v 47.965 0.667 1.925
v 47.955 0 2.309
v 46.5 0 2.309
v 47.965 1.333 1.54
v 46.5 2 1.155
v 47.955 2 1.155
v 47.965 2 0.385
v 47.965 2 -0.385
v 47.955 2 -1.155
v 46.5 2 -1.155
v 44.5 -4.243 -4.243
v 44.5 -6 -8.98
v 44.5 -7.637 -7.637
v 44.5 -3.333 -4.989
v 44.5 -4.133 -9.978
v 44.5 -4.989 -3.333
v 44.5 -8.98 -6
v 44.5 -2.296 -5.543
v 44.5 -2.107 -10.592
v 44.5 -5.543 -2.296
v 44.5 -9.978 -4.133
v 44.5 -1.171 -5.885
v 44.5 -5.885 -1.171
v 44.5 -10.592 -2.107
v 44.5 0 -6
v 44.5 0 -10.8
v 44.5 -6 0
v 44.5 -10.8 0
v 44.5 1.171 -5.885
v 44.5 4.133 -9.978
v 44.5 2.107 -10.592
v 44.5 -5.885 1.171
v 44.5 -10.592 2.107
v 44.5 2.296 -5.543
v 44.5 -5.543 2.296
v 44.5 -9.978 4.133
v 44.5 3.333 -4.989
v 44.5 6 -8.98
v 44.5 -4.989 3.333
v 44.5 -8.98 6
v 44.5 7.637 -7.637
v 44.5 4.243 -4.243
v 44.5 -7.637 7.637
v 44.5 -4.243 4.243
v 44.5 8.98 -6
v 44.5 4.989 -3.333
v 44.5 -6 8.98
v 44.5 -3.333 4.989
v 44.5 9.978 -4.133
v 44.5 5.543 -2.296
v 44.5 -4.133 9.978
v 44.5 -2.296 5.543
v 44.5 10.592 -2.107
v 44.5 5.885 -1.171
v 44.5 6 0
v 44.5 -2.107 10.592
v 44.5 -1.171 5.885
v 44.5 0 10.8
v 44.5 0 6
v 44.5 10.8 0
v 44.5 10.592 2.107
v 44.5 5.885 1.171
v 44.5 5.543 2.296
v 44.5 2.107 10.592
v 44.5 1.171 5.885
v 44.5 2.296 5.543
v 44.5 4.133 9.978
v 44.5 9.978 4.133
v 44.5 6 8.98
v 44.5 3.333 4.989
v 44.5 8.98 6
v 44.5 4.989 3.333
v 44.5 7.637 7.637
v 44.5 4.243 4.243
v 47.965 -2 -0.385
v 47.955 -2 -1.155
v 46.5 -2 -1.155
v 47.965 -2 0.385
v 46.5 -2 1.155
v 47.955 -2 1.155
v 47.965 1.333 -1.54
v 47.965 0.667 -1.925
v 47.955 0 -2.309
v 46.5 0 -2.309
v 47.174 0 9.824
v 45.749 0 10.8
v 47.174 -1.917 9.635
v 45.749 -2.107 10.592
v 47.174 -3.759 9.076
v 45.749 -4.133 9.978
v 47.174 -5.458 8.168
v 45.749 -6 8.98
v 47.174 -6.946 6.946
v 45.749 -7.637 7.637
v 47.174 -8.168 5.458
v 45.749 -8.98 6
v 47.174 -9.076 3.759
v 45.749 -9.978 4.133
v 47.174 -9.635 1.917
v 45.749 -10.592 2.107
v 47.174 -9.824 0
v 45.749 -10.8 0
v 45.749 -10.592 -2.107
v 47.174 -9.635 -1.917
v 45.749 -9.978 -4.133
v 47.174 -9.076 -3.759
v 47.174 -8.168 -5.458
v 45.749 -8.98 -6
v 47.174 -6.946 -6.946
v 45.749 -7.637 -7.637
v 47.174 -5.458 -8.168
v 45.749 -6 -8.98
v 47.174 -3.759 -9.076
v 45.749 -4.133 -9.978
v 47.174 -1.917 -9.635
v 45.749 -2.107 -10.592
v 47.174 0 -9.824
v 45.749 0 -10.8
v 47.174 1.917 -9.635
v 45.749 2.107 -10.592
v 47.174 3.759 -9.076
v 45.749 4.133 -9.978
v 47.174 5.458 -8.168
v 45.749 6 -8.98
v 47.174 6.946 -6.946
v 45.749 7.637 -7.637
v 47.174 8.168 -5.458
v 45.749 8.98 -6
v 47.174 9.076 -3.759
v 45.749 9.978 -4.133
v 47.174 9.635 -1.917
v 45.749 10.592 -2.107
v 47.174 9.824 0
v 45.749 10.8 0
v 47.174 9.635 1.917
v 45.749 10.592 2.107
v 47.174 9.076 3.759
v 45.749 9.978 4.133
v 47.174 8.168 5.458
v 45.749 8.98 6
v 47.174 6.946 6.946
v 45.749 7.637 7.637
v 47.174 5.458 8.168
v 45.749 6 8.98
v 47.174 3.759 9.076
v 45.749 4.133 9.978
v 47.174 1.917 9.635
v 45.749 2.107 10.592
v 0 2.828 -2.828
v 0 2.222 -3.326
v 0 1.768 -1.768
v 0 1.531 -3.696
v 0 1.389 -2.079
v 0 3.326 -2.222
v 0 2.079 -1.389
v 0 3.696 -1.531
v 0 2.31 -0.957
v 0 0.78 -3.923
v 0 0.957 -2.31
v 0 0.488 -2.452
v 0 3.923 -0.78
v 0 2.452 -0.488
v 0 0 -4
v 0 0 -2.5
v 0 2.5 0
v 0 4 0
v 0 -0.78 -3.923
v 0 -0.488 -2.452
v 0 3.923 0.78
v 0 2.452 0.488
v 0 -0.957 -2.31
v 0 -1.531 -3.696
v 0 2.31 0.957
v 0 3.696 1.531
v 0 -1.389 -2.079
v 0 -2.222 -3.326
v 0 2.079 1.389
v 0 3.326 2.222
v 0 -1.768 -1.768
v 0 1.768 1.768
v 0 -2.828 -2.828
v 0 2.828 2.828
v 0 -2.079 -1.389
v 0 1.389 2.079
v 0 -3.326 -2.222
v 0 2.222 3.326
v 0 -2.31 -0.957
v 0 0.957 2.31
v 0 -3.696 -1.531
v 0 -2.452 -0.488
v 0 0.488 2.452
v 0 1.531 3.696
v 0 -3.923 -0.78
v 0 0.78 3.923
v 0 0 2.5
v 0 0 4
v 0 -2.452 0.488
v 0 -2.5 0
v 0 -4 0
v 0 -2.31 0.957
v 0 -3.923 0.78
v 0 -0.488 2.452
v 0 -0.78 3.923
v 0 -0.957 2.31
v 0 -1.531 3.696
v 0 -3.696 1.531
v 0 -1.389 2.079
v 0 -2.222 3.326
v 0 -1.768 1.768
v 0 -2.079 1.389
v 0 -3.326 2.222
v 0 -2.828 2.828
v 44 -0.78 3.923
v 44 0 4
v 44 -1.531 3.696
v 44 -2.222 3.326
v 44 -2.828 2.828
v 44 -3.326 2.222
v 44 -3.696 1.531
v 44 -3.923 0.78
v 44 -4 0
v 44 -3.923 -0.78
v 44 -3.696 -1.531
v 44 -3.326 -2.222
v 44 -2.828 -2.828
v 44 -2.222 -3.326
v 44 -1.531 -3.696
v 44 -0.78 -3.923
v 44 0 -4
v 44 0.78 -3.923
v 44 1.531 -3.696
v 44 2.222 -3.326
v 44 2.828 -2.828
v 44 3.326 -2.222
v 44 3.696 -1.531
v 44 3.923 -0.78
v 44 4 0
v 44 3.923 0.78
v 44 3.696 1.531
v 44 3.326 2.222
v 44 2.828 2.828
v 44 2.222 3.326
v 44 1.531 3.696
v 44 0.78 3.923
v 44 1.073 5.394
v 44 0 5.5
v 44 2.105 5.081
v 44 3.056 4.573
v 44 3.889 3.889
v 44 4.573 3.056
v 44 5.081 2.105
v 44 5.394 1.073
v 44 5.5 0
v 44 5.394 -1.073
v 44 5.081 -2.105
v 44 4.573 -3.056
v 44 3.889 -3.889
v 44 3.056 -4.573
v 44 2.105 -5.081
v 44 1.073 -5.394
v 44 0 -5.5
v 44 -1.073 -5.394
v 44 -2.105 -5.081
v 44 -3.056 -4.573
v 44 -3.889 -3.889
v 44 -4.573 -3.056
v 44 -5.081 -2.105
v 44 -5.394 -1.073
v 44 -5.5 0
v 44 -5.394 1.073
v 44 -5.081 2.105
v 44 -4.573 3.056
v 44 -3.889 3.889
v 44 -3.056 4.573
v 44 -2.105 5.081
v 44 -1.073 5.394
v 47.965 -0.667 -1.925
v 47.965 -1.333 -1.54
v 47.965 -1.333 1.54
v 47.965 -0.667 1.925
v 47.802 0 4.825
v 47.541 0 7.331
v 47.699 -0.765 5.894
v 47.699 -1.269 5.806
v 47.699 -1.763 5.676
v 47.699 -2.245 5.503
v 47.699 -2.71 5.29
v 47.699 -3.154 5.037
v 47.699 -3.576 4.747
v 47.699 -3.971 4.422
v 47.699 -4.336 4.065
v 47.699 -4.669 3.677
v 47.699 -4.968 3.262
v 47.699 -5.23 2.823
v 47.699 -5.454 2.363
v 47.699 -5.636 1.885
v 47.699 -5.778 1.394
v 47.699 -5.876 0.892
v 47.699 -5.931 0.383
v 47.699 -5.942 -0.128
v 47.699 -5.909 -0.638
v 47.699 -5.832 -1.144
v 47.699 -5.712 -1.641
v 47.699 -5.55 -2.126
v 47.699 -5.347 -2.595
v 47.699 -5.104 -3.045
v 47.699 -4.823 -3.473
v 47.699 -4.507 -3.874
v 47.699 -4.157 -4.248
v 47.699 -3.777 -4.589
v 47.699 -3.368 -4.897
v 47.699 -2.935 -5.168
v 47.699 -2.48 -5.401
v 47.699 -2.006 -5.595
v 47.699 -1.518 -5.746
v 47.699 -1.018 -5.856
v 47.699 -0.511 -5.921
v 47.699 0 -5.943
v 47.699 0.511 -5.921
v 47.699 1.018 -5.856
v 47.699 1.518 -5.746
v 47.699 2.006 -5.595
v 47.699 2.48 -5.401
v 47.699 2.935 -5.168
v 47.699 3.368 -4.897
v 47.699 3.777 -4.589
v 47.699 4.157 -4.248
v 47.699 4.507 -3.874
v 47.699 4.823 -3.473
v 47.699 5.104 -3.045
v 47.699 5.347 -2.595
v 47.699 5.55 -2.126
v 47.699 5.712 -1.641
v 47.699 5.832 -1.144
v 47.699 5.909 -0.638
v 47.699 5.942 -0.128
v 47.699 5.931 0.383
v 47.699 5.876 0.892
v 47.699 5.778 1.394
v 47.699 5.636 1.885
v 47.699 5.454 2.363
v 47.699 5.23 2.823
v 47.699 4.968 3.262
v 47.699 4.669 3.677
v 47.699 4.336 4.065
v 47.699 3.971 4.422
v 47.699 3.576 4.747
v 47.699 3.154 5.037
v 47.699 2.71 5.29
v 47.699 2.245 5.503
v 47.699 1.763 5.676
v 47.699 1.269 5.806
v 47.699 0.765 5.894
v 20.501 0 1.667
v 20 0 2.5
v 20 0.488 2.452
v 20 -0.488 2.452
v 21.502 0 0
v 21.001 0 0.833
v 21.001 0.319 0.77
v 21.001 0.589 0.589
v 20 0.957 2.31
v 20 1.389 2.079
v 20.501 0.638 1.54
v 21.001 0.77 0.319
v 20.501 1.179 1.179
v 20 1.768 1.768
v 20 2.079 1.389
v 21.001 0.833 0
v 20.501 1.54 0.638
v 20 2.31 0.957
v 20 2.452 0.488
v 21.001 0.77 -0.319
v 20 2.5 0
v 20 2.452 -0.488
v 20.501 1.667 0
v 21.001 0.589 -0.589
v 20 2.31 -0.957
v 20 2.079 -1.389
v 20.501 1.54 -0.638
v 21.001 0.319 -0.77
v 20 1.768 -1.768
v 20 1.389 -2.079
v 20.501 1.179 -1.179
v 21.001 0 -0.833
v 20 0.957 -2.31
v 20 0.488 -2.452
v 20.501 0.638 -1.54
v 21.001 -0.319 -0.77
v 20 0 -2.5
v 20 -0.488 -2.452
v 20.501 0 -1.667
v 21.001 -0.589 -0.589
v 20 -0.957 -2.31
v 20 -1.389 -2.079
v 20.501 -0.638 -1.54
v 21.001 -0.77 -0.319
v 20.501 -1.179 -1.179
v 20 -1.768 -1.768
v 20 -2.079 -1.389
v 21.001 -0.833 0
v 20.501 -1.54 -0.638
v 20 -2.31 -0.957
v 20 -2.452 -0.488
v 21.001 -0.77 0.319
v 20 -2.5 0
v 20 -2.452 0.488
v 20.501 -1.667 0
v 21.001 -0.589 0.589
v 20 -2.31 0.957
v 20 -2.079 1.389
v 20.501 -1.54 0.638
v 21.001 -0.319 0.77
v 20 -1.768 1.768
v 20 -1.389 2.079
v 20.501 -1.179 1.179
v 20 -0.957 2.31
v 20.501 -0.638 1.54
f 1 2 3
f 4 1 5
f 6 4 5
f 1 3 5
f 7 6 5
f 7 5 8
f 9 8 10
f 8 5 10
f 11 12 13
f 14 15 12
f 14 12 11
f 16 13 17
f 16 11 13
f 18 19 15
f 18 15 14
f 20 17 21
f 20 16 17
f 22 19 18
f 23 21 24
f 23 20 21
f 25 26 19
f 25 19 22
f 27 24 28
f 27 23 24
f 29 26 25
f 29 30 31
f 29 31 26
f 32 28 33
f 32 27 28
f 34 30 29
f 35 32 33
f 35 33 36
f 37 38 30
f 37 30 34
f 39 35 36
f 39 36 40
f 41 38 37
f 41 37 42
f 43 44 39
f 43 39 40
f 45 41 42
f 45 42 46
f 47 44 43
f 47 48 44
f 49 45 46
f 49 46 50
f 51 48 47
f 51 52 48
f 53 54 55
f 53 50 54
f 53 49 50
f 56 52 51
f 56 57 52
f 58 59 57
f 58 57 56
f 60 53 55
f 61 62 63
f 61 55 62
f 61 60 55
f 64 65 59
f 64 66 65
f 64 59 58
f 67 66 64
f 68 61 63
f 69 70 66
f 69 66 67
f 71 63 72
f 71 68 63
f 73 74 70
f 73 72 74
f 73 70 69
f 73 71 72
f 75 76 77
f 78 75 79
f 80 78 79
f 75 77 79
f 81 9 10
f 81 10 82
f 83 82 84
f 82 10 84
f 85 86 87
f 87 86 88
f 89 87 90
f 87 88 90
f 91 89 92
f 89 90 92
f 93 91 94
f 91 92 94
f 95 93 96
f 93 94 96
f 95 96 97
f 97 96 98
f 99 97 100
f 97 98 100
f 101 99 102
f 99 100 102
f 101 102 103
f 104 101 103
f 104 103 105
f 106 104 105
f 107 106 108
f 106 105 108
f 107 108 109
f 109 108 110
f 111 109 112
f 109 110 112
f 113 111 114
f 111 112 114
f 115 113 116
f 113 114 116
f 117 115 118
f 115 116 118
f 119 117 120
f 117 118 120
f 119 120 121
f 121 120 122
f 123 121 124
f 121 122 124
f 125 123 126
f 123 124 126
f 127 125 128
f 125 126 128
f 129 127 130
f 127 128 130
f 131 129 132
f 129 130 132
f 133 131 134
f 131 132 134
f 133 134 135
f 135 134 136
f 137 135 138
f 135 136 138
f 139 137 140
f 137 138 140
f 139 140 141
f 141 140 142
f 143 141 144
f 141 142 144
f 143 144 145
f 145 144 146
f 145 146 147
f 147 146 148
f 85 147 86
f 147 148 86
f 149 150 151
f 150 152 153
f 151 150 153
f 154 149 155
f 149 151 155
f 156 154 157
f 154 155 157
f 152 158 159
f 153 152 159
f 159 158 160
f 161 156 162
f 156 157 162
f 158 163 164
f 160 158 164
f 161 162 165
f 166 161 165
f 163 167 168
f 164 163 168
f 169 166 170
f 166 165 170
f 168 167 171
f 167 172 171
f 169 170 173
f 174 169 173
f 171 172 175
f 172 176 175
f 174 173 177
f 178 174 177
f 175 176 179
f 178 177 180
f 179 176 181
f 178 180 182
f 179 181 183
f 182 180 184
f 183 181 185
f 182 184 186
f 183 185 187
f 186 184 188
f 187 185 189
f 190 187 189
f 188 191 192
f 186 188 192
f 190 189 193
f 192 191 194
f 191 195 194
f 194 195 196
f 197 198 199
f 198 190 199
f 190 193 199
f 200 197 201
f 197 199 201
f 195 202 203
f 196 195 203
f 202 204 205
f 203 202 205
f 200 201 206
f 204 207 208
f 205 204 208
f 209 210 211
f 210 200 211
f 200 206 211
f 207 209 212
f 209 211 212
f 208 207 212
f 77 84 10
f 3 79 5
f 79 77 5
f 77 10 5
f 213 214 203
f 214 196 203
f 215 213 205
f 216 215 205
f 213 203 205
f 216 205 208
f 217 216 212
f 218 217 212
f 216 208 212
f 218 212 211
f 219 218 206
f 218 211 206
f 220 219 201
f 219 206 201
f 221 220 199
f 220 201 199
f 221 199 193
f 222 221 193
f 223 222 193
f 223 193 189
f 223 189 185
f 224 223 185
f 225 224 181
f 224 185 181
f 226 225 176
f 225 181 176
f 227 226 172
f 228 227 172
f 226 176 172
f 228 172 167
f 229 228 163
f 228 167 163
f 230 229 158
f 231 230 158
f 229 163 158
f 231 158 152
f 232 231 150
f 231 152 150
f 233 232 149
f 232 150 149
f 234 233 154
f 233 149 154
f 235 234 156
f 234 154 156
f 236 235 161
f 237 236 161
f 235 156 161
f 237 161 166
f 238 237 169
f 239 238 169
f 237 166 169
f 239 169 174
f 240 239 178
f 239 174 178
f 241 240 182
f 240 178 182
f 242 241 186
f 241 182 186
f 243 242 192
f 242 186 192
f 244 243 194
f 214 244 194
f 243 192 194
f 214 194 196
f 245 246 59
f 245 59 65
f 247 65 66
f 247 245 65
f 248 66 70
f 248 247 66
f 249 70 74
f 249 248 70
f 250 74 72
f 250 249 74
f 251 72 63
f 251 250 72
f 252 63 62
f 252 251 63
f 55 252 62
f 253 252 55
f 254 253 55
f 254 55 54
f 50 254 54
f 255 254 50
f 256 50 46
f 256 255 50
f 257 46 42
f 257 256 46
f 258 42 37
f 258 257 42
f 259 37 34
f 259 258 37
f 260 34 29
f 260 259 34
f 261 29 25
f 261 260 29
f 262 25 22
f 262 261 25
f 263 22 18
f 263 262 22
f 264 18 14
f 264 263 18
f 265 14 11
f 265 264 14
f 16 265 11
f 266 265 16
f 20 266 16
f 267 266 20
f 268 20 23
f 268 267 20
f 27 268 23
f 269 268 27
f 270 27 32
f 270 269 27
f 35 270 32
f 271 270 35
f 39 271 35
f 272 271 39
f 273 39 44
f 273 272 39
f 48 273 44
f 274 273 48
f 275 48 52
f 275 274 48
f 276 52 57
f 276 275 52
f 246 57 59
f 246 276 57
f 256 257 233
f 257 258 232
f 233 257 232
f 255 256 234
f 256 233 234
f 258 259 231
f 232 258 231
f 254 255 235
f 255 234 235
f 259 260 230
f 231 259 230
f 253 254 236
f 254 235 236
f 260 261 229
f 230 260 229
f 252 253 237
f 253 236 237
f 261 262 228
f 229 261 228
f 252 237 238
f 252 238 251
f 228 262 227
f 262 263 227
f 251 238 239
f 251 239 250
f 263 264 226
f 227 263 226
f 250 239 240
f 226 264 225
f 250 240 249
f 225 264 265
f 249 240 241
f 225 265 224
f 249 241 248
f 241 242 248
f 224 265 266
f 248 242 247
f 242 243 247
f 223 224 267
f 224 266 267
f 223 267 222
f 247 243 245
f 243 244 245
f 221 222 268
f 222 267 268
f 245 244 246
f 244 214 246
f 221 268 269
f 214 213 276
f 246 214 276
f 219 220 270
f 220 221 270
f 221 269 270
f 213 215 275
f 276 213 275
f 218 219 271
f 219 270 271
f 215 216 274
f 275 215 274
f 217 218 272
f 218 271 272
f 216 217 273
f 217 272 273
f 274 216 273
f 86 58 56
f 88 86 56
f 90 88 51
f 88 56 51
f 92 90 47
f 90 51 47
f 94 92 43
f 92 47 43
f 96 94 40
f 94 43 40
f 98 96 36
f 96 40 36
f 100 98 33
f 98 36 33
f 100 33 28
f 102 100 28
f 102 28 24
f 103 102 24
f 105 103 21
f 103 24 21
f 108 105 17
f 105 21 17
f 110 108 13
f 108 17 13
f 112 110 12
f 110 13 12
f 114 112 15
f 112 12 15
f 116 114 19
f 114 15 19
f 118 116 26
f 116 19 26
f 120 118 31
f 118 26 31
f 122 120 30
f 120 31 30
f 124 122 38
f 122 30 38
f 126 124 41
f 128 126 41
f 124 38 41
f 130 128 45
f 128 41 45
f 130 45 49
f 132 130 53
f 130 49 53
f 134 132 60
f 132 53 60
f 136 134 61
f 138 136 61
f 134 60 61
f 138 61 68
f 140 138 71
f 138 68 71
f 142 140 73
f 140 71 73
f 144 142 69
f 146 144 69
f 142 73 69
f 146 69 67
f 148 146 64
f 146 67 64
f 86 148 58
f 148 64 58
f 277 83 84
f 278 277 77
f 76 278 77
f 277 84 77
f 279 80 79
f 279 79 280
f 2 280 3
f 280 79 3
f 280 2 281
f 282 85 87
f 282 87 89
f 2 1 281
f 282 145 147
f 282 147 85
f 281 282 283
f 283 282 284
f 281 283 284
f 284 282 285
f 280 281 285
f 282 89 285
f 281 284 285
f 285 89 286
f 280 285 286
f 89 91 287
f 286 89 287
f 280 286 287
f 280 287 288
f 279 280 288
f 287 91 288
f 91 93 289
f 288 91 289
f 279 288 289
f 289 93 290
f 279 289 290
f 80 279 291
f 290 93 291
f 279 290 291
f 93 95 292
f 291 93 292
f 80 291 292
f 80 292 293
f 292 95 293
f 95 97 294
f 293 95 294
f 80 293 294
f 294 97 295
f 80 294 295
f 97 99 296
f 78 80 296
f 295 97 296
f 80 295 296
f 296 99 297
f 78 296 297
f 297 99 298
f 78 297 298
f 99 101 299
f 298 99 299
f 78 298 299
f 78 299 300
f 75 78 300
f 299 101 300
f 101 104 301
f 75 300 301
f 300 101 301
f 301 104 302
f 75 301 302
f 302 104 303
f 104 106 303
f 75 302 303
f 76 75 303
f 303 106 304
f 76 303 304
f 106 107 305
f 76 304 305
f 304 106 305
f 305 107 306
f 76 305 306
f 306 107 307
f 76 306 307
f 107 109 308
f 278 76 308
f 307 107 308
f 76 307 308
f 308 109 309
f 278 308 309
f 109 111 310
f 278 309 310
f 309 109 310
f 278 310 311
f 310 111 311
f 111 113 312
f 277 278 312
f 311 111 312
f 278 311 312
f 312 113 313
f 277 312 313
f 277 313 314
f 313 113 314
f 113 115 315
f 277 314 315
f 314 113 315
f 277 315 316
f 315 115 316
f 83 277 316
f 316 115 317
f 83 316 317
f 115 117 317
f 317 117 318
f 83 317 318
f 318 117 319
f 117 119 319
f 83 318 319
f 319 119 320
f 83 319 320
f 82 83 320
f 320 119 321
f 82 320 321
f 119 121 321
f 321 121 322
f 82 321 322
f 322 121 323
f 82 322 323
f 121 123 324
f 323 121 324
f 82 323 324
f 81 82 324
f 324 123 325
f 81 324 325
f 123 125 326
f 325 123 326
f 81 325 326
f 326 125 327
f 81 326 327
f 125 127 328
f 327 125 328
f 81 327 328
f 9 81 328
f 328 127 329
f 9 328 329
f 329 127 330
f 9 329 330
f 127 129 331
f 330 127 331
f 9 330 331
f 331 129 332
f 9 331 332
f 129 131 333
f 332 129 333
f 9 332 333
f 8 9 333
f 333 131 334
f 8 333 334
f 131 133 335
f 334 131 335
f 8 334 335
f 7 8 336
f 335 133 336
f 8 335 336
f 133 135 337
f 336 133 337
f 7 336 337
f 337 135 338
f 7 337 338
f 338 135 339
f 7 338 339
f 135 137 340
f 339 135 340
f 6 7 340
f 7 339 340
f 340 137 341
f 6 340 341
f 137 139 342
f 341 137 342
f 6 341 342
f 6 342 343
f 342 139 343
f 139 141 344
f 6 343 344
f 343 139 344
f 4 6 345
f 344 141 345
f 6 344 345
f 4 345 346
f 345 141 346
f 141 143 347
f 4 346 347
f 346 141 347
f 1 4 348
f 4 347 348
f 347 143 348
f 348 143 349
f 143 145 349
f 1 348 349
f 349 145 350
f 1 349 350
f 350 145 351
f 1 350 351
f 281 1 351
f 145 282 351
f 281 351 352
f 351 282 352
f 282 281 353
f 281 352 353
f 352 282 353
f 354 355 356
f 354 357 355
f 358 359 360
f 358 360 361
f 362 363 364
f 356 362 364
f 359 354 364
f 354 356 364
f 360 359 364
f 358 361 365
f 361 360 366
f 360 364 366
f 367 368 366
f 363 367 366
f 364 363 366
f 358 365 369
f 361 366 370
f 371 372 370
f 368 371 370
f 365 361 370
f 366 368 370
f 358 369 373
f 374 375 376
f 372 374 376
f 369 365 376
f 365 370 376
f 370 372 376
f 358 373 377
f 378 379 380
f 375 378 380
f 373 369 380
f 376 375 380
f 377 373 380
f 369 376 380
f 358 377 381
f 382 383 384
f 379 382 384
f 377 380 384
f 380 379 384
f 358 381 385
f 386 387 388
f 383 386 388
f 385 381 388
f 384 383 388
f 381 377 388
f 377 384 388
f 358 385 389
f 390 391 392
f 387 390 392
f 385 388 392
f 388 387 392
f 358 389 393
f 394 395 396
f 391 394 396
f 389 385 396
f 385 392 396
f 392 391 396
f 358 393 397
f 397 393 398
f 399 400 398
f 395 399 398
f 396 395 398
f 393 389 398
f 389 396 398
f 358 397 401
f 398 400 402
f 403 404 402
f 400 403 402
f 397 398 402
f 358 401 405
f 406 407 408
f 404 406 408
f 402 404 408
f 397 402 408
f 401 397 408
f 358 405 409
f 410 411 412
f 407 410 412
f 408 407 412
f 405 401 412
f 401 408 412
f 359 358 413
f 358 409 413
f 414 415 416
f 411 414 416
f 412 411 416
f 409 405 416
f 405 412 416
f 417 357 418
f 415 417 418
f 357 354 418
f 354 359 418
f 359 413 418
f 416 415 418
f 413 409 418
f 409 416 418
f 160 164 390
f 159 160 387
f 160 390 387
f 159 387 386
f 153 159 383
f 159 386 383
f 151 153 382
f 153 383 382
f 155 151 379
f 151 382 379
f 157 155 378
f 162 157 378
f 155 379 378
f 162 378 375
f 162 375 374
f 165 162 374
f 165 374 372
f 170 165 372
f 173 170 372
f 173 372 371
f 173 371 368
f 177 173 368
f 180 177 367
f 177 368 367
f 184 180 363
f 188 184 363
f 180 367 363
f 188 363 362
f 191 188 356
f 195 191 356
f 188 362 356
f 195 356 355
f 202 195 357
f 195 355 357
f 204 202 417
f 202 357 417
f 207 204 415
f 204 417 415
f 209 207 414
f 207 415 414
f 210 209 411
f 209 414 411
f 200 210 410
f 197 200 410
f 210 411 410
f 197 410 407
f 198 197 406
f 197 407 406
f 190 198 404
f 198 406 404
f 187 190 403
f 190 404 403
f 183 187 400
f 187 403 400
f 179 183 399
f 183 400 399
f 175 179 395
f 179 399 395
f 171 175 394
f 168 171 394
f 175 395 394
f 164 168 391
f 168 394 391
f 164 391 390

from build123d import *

# Parameters (mm, degrees)
M6_TAPPED_HOLE1_D     = 5
M6_TAPPED_HOLE1_DEPTH = 20
M6_TAPPED_HOLE1_TIP   = 1.502151548
CHAMFER1_SIZE         = 1.25095704
SKETCH8_R             = 10.8
SKETCH8_R_2           = 6
CUT_EXTRUDE2_DEPTH    = 0.5
CHAMFER2_SIZE         = 0.5
CUT_EXTRUDE3_START    = -2
CUT_EXTRUDE3_DEPTH    = 46.048166808


# Some blends are built 0.0001 mm under size
with BuildPart() as part:
    # Sketch1 → Revolve1 (revolve)
    with BuildSketch(Plane.XY, mode=Mode.PRIVATE) as revolve1_sk:
        with BuildLine():
            Line((0, 0), (48, 0))
            ThreePointArc((48, 0), (47.749466448, 5.423098745), (47, 10.8))
            Line((47, 10.8), (44, 10.8))
            Line((44, 10.8), (44, 4))
            Line((44, 4), (0, 4))
            Line((0, 4), (0, 0))
        make_face()
    revolve(revolve1_sk.sketch.rotate(Axis((0, 0, 0), (1, 0, 0)), 90), axis=Axis((0, 0, 0), (1, 0, 0)))

    # M6 Tapped Hole1
    with Locations(Plane.ZY):
        with Locations((0, 0)):
            Hole(M6_TAPPED_HOLE1_D / 2, depth=M6_TAPPED_HOLE1_DEPTH)
            with Locations((0, 0, -(M6_TAPPED_HOLE1_DEPTH + M6_TAPPED_HOLE1_TIP / 2))):  # 118° drill point
                Cone(0, M6_TAPPED_HOLE1_D / 2, M6_TAPPED_HOLE1_TIP, mode=Mode.SUBTRACT)

    # Chamfer1
    # the kernel refuses this chamfer: 1.25095704, 1 mm, written as the material it takes off along each edge
    with BuildSketch(Plane(origin=(47, 0, 0), x_dir=(0, 0, 1), z_dir=(0, 1, 0))) as chamfer1_piece_1:
        with BuildLine():
            Line((9.823683565, 0.173858651), (10.8, -CHAMFER1_SIZE))
            Line((10.8, -CHAMFER1_SIZE), (10.8, 0))
            ThreePointArc((10.8, 0), (10.294942592, 0.092058822), (9.823683565, 0.173858651))
        make_face()
    revolve(axis=Axis((47, 0, 0), (1, 0, 0)), mode=Mode.SUBTRACT)

    # Sketch8 → Cut-Extrude2 (cut)
    with BuildSketch(Plane.ZY.offset(-44)):
        Circle(SKETCH8_R)
        Circle(SKETCH8_R_2, mode=Mode.SUBTRACT)
    extrude(amount=-CUT_EXTRUDE2_DEPTH, mode=Mode.SUBTRACT)

    # Chamfer2
    chamfer2_edges = [part.edges().sort_by_distance(p)[0] for p in [
        (44, 0, -6),
    ]]
    chamfer(chamfer2_edges, length=CHAMFER2_SIZE - 0.0001)  # a hair under: the kernel refuses the full size

    # Sketch9 → Cut-Extrude3 (cut, through all)
    with BuildSketch(Plane.ZY.offset(-44.5).offset(CUT_EXTRUDE3_START)):
        Polygon((1.154700538, -2), (2.309401077, 0), (1.154700538, 2), (-1.154700538, 2), (-2.309401077, 0), (-1.154700538, -2), align=None)
    extrude(amount=-CUT_EXTRUDE3_DEPTH, mode=Mode.SUBTRACT)


solid = part.part
